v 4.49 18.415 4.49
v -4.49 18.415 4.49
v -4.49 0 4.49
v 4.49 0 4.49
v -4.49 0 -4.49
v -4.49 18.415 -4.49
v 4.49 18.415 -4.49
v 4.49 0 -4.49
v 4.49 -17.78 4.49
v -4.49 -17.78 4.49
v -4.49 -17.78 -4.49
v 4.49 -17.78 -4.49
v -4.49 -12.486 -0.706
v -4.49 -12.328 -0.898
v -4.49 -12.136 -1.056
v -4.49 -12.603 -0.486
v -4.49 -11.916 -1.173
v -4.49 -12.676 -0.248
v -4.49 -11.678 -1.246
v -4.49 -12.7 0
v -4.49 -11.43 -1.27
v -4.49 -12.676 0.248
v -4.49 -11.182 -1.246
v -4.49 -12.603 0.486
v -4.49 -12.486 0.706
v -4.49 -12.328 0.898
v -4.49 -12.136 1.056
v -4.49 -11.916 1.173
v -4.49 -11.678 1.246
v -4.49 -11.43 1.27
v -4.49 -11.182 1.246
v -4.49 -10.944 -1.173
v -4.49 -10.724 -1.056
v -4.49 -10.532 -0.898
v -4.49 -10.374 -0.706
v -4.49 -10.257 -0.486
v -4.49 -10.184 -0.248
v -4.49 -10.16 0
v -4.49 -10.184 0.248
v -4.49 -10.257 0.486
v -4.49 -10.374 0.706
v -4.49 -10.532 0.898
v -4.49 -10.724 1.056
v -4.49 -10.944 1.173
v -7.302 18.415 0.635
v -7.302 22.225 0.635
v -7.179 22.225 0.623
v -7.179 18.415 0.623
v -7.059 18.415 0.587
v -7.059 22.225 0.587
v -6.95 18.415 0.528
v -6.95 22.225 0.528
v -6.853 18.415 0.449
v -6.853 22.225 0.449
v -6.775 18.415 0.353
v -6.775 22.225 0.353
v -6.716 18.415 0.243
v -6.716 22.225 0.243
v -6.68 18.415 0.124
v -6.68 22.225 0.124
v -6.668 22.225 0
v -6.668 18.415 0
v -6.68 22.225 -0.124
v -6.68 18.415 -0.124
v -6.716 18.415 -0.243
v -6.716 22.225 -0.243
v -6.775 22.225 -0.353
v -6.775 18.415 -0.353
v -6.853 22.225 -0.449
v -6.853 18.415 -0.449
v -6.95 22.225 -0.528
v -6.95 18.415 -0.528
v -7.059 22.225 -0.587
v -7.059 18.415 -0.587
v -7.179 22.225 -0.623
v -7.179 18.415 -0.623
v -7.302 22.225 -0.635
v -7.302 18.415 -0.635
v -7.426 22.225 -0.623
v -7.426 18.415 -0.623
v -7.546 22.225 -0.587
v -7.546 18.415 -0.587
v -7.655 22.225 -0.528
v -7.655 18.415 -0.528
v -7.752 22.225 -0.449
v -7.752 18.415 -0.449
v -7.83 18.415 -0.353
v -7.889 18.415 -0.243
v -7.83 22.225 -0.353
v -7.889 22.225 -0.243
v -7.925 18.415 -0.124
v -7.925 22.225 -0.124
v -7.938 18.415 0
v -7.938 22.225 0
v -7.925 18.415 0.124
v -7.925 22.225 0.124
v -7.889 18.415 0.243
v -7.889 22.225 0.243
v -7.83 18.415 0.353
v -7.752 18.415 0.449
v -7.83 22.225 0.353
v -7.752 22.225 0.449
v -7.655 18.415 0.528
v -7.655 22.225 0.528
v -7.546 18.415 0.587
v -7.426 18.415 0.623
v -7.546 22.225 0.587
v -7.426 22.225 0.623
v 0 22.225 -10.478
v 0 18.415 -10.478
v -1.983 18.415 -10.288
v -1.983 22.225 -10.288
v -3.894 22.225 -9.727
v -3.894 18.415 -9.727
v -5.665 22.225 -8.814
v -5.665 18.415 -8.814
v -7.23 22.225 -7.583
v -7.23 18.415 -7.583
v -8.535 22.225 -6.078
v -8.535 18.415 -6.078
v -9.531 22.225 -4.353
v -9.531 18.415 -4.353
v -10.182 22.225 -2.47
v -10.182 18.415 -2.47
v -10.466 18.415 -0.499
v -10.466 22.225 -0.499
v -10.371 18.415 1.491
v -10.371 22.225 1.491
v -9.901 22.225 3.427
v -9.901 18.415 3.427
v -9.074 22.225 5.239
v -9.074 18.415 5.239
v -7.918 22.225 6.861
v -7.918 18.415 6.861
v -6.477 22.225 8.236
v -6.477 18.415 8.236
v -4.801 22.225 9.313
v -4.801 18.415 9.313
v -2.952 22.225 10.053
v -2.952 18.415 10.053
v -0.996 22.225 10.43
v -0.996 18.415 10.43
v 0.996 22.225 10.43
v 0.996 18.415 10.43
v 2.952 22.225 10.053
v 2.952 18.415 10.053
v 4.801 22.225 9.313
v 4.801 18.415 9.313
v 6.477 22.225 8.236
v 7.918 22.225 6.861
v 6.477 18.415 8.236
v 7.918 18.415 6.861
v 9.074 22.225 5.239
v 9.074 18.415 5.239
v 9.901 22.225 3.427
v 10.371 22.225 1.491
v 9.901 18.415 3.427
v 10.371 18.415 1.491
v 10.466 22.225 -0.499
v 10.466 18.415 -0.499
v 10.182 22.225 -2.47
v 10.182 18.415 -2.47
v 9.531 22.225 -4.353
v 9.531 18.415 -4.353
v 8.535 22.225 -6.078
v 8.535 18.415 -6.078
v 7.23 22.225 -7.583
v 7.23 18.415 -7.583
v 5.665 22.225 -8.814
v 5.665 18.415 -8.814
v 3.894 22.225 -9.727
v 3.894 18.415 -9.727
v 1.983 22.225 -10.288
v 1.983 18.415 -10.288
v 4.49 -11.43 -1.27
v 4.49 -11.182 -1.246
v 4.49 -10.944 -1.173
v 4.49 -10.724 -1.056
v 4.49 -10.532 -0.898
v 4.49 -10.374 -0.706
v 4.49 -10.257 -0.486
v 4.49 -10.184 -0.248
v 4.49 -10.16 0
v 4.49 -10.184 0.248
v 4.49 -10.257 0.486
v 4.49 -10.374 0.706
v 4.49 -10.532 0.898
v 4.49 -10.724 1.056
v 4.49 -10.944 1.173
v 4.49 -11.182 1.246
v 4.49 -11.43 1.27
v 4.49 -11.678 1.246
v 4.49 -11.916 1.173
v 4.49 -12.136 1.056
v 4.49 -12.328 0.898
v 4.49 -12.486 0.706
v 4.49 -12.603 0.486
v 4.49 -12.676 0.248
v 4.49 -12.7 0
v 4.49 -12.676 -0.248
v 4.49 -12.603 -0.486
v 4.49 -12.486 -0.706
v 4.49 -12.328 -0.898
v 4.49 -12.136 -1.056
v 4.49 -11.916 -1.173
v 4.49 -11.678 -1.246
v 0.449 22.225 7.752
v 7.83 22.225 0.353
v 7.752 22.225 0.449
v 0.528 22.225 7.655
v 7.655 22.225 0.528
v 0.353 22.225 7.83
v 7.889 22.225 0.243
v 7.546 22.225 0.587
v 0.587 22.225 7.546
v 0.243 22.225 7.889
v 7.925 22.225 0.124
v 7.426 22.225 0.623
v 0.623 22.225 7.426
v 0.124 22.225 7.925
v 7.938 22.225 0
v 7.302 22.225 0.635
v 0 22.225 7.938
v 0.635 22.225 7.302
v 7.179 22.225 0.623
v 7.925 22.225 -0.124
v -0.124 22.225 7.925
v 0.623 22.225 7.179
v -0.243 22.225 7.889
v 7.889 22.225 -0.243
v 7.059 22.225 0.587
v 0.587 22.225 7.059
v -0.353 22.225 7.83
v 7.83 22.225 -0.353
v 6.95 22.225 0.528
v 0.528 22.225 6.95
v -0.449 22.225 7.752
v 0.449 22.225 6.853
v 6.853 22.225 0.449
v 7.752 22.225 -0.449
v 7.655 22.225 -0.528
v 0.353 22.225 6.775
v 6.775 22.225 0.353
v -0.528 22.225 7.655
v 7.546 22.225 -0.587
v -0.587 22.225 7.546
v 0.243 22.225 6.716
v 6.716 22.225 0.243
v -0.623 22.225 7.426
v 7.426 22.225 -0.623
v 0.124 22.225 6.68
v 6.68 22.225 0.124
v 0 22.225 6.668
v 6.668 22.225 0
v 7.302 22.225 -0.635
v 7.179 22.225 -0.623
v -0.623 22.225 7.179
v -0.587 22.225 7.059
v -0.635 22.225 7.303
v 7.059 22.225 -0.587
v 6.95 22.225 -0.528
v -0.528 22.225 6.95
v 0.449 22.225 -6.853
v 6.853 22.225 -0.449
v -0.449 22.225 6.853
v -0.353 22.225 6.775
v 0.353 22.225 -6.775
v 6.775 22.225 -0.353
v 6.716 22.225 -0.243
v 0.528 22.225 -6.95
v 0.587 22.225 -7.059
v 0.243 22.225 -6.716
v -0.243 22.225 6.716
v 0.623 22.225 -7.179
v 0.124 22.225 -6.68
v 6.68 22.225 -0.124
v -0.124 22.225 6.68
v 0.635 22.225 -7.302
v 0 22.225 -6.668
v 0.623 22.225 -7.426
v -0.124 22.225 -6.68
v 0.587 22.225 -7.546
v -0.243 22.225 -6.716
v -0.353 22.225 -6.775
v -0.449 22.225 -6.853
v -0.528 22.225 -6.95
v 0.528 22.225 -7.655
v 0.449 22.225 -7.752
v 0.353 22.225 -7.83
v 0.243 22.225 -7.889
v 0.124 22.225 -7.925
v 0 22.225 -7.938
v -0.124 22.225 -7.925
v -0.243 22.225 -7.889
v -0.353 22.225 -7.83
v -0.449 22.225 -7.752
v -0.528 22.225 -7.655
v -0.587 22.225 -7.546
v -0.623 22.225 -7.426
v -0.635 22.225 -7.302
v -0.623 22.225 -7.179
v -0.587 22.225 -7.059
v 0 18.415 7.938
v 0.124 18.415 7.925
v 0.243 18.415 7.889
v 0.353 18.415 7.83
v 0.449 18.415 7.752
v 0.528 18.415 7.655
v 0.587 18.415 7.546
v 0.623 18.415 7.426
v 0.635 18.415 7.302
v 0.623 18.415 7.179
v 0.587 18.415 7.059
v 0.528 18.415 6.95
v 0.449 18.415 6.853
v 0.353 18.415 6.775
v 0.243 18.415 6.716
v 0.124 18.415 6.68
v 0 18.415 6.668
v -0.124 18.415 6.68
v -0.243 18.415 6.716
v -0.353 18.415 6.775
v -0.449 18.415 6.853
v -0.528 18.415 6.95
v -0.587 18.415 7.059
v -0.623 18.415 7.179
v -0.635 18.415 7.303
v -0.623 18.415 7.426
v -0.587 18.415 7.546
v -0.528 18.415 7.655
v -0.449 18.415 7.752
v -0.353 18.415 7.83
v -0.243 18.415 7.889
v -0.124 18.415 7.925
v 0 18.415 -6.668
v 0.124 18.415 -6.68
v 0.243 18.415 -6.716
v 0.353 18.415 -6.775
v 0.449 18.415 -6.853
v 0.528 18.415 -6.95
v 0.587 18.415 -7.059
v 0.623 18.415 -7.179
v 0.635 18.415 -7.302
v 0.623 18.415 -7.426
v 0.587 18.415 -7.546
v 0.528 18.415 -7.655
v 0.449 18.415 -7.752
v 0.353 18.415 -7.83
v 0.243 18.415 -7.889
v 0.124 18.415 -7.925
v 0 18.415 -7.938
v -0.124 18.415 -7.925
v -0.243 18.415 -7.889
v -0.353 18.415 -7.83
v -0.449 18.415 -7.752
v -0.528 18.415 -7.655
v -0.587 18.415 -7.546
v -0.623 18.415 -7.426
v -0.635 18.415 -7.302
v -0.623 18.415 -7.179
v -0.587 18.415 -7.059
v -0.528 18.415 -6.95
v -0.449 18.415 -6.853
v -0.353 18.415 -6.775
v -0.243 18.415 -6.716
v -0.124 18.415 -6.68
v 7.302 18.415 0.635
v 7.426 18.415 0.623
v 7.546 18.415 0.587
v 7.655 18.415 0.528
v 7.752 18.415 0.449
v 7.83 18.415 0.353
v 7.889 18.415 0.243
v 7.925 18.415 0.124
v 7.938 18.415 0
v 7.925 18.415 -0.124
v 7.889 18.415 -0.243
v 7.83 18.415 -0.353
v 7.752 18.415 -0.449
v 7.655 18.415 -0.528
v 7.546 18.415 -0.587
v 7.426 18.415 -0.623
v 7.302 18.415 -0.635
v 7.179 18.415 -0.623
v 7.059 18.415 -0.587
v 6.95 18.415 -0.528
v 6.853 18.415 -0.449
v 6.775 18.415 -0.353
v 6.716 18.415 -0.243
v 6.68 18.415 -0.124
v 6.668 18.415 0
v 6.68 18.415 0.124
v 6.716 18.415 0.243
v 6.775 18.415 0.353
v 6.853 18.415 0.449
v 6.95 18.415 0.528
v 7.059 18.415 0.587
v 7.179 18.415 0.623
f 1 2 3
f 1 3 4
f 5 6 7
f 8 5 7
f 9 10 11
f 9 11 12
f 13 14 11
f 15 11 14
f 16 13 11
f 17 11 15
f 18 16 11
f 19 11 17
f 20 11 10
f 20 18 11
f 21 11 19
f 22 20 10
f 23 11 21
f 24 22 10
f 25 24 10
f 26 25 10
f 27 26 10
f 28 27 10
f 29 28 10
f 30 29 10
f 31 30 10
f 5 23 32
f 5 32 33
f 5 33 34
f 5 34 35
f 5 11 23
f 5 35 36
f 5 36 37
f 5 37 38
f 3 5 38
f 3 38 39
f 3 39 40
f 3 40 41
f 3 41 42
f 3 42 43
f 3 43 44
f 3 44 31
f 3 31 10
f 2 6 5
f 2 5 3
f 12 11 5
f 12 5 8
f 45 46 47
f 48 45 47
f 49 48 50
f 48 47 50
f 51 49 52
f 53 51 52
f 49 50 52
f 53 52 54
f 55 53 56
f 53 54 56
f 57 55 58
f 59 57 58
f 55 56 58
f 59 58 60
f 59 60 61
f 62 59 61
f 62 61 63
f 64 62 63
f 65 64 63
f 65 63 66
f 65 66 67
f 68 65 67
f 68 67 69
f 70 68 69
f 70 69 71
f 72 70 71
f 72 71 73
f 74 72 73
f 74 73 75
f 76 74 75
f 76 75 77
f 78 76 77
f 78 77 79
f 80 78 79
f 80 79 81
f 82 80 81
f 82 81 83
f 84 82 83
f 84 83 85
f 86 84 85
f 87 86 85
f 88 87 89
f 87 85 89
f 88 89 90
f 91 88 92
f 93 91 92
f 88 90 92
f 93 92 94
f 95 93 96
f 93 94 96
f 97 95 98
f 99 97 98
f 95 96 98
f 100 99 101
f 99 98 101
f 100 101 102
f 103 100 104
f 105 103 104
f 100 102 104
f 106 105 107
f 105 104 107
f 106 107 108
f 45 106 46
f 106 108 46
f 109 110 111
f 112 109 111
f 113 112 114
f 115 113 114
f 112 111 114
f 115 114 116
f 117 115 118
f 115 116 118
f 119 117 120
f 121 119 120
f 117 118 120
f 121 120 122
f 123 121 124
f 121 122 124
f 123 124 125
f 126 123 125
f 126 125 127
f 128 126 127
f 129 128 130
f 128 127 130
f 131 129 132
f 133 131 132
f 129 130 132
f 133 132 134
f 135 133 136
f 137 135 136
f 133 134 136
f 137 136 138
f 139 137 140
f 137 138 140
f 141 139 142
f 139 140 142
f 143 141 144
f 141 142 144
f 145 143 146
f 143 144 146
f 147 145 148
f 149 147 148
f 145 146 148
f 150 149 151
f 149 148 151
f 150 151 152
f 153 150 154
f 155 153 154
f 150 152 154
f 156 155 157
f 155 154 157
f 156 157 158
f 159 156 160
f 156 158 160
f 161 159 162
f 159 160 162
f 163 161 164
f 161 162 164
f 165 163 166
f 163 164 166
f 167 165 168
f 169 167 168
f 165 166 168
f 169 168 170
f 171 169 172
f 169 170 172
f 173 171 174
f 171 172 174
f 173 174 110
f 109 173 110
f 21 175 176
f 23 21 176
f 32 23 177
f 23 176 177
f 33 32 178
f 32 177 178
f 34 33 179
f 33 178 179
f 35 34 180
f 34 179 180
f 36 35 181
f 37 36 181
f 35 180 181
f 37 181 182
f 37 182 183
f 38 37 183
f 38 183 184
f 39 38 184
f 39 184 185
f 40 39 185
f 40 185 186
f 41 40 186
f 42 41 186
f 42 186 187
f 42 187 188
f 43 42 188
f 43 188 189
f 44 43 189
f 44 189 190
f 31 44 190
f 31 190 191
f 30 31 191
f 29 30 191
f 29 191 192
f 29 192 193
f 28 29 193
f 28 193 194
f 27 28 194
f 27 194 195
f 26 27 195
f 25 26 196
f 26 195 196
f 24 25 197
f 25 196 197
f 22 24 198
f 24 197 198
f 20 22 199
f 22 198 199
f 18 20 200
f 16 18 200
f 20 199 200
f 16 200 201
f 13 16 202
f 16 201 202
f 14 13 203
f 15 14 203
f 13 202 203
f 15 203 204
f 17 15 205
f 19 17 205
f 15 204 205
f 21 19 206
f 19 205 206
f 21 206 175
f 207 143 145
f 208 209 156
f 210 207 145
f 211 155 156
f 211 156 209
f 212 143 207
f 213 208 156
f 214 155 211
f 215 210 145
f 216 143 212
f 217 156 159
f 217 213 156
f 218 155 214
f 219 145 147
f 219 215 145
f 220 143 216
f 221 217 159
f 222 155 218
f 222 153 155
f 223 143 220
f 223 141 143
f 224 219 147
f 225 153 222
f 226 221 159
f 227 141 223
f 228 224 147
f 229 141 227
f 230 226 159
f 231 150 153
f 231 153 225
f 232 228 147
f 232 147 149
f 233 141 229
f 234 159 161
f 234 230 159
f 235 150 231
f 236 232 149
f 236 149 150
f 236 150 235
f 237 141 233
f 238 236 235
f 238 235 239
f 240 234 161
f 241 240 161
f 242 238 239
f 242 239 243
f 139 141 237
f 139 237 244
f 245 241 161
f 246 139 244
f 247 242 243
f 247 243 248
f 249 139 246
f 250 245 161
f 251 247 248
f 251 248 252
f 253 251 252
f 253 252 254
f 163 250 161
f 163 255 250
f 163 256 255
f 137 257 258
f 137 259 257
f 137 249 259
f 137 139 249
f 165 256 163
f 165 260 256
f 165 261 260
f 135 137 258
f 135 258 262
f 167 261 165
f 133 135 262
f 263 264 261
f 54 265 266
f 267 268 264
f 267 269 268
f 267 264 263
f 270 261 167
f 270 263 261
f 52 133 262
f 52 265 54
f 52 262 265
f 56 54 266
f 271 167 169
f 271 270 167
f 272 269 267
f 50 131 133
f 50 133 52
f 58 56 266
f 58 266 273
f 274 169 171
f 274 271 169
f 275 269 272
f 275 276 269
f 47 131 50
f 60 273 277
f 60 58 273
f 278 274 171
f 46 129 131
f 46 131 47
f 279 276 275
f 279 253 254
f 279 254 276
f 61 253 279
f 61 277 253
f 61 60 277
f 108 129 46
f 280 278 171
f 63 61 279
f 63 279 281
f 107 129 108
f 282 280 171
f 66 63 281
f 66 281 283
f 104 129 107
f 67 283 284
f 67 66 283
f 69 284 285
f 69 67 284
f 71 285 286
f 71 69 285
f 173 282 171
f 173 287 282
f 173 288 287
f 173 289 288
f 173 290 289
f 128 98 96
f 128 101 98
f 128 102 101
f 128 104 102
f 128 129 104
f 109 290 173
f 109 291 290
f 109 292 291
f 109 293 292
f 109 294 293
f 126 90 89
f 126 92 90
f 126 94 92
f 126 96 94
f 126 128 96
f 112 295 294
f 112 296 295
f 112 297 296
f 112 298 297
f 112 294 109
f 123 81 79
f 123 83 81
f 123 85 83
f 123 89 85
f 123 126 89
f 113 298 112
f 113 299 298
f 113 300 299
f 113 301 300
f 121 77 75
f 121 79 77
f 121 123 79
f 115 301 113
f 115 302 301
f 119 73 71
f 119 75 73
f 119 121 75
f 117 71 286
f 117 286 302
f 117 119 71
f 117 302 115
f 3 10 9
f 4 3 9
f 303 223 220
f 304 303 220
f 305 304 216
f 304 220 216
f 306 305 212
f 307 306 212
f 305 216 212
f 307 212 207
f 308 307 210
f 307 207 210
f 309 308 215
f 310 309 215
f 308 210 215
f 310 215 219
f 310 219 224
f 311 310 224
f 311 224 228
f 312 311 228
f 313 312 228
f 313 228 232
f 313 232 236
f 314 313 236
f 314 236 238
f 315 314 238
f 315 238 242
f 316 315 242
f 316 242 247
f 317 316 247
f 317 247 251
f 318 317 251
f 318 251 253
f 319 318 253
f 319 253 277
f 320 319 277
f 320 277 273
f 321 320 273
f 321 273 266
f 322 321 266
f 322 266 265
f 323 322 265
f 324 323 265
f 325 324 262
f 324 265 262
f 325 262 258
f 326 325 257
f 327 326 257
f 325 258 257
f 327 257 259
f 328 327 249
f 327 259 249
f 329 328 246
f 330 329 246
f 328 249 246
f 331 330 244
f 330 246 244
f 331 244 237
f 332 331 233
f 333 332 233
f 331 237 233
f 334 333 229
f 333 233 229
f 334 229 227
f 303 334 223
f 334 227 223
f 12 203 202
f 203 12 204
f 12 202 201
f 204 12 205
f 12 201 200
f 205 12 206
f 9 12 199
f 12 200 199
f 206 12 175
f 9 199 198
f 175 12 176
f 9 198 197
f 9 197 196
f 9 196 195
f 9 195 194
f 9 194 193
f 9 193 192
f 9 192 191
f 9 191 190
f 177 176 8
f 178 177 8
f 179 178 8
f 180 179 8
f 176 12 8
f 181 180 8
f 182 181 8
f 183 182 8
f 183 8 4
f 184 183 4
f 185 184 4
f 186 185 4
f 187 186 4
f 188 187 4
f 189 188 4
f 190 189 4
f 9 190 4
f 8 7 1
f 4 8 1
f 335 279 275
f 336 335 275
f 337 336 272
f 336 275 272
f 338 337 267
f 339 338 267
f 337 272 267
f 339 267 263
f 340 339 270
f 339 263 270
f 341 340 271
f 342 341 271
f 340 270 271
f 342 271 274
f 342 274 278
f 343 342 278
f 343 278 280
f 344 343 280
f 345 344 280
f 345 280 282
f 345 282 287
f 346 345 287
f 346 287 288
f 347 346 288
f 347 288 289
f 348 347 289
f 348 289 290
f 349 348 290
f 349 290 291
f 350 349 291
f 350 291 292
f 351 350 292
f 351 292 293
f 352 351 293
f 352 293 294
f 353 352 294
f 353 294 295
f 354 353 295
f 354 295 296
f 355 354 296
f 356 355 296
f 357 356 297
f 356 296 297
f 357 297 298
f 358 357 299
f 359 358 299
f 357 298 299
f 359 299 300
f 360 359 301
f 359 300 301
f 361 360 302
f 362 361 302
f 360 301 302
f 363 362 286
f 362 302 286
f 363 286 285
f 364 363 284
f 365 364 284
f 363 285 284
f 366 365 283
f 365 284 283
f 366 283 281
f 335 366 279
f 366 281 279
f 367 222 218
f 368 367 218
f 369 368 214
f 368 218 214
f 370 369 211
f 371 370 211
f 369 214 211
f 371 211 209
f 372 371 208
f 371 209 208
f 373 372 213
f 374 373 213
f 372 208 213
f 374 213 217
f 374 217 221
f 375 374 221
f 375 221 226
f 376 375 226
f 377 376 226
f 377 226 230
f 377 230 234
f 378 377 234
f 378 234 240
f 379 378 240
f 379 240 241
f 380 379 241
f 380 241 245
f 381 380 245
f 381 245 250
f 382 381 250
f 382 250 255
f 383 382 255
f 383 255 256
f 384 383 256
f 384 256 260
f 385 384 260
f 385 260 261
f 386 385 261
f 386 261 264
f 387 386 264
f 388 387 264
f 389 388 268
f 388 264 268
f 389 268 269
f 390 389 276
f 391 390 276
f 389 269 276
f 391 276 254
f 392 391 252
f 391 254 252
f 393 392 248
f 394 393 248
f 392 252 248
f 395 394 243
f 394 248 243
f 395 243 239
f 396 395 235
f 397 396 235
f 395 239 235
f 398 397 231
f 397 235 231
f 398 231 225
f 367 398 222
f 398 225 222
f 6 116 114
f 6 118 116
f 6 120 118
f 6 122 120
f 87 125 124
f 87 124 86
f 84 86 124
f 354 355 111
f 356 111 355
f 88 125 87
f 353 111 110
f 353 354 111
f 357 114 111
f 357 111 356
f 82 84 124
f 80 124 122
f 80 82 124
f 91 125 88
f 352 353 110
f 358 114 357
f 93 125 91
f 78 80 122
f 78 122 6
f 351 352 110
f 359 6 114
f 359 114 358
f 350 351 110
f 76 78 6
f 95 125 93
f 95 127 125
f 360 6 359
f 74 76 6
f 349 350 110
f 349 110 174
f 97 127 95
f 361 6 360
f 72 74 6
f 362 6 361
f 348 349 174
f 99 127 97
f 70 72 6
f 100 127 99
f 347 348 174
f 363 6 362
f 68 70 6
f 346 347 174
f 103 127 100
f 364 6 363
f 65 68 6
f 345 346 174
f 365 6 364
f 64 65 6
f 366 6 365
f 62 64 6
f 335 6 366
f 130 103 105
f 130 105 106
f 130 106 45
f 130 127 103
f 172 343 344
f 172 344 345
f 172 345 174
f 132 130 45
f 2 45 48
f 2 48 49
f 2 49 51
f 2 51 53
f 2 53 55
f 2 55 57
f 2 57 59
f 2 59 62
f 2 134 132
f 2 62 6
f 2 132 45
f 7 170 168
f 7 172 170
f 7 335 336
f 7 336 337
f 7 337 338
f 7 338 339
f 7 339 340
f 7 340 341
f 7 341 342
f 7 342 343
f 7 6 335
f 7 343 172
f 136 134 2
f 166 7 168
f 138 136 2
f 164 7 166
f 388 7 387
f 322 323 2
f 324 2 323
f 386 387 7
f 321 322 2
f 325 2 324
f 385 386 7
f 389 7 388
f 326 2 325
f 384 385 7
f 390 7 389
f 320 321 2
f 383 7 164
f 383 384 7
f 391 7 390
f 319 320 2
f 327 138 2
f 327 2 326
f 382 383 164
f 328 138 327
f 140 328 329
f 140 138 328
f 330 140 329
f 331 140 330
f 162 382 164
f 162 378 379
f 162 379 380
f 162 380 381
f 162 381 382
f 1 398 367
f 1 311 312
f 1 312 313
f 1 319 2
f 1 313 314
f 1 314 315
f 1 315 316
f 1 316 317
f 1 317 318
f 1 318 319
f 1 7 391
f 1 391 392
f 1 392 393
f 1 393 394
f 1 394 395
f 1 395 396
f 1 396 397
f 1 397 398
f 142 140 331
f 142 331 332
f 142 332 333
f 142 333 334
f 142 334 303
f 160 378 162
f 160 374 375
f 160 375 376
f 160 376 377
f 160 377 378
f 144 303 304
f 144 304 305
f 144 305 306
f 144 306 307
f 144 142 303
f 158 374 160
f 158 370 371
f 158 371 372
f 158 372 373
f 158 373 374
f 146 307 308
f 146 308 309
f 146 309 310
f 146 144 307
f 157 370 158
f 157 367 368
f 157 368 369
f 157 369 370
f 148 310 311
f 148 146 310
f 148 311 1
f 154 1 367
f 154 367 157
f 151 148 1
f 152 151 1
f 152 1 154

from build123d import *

# Parameters (mm, degrees)
SKETCH1_W           = 8.98144
SKETCH1_H           = 8.979072086
BOSS_EXTRUDE1_DEPTH = 18.415
SKETCH2_R           = 10.4775
BOSS_EXTRUDE2_DEPTH = 3.81
BOSS_EXTRUDE4_START = 5.08
SKETCH4_R           = 10.4775
BOSS_EXTRUDE4_DEPTH = 5.08
SKETCH5_R           = 20.080329598
CUT_EXTRUDE1_DEPTH  = 5.08
SKETCH6_R           = 11.7475
BOSS_EXTRUDE5_DEPTH = 1.27
SKETCH10_R          = 0.635
CUT_EXTRUDE3_DEPTH  = 5.08
SKETCH11_W          = 8.980256122
SKETCH11_H          = 8.980256122
BOSS_EXTRUDE6_DEPTH = 11.43
SKETCH12_R          = 1.27
CUT_EXTRUDE4_DEPTH  = 30.926826532
SKETCH13_R          = 16.332620974
SKETCH13_W          = 8.980256122
SKETCH13_H          = 8.980256122
CUT_EXTRUDE5_DEPTH  = 24.765


with BuildPart() as part:
    # Sketch1 → Boss-Extrude1 (new body)
    with BuildSketch(Plane(origin=(0, 0, 0), x_dir=(1, 0, 0), z_dir=(0, 1, 0))):
        Rectangle(SKETCH1_W, SKETCH1_H)
    extrude(amount=BOSS_EXTRUDE1_DEPTH)

    # Sketch2 → Boss-Extrude2 (add)
    with BuildSketch(Plane(origin=(0, 18.415, 0), x_dir=(1, 0, 0), z_dir=(0, 1, 0))):
        with Locations(Location((0, 0, 0), (0, 0, 90))):
            Circle(SKETCH2_R)
    extrude(amount=BOSS_EXTRUDE2_DEPTH)

    # Sketch4 → Boss-Extrude4 (add)
    with BuildSketch(Plane.XZ.offset(BOSS_EXTRUDE4_START)):
        with Locations(Location((0, 0, 0), (0, 0, 270))):
            Circle(SKETCH4_R)
    extrude(amount=-BOSS_EXTRUDE4_DEPTH)

    # Sketch5 → Cut-Extrude1 (cut)
    with BuildSketch(Plane.XZ.offset(5.08)):
        Circle(SKETCH5_R)
        Polygon((0, 17.195074229), (-1.836150497, 7.449555405), (-7.990949439, 15.225482088), (-5.087811539, 5.742952038), (-14.151268663, 9.767915487), (-7.173916273, 2.72070757), (-17.069702778, 2.072637164), (-7.616563244, -0.924818214), (-16.077673698, -6.097457355), (-6.314347365, -4.358479291), (-11.402443331, -12.870697876), (-3.565590601, -6.793665288), (-4.115050612, -16.695416623), (0, -7.67250444), (4.115050612, -16.695416623), (3.565590601, -6.793665288), (11.402443331, -12.870697876), (6.314347365, -4.358479291), (16.077673698, -6.097457355), (7.616563244, -0.924818214), (17.069702778, 2.072637164), (7.173916273, 2.72070757), (14.151268663, 9.767915487), (5.087811539, 5.742952038), (7.990949439, 15.225482088), (1.836150497, 7.449555405), align=None, mode=Mode.SUBTRACT)
    extrude(amount=-CUT_EXTRUDE1_DEPTH, mode=Mode.SUBTRACT)

    # Sketch6 → Boss-Extrude5 (add)
    with BuildSketch(Plane.XZ.offset(5.08)):
        with Locations(Location((0, 0, 0), (0, 0, 270))):
            Circle(SKETCH6_R)
    extrude(amount=BOSS_EXTRUDE5_DEPTH)

    # Sketch10 → Cut-Extrude3 (cut)
    with BuildSketch(Plane(origin=(0, 22.225, 0), x_dir=(1, 0, 0), z_dir=(0, 1, 0))):
        with Locations(Location((0, 7.3025, 0), (0, 0, 270))):
            Circle(SKETCH10_R)
        with Locations(Location((7.3025, 0, 0), (0, 0, 270))):
            Circle(SKETCH10_R)
        with Locations(Location((-7.3025, 0, 0), (0, 0, 270))):
            Circle(SKETCH10_R)
        with Locations(Location((0, -7.3025, 0), (0, 0, 270))):
            Circle(SKETCH10_R)
    extrude(amount=-CUT_EXTRUDE3_DEPTH, mode=Mode.SUBTRACT)

    # Sketch11 → Boss-Extrude6 (add)
    with BuildSketch(Plane.XZ.offset(6.35)):
        Rectangle(SKETCH11_W, SKETCH11_H)
    extrude(amount=BOSS_EXTRUDE6_DEPTH)

    # Sketch12 → Cut-Extrude4 (cut, through all)
    with BuildSketch(Plane(origin=(4.490128061, 0, 0), x_dir=(0, 0, -1), z_dir=(1, 0, 0))):
        with Locations((0, -11.43)):
            Circle(SKETCH12_R)
    extrude(amount=-CUT_EXTRUDE4_DEPTH, mode=Mode.SUBTRACT)

    # Sketch13 → Cut-Extrude5 (cut)
    with BuildSketch(Plane.XZ.offset(6.35)):
        Circle(SKETCH13_R)
        Rectangle(SKETCH13_W, SKETCH13_H, mode=Mode.SUBTRACT)
    extrude(amount=-CUT_EXTRUDE5_DEPTH, mode=Mode.SUBTRACT)


solid = part.part
